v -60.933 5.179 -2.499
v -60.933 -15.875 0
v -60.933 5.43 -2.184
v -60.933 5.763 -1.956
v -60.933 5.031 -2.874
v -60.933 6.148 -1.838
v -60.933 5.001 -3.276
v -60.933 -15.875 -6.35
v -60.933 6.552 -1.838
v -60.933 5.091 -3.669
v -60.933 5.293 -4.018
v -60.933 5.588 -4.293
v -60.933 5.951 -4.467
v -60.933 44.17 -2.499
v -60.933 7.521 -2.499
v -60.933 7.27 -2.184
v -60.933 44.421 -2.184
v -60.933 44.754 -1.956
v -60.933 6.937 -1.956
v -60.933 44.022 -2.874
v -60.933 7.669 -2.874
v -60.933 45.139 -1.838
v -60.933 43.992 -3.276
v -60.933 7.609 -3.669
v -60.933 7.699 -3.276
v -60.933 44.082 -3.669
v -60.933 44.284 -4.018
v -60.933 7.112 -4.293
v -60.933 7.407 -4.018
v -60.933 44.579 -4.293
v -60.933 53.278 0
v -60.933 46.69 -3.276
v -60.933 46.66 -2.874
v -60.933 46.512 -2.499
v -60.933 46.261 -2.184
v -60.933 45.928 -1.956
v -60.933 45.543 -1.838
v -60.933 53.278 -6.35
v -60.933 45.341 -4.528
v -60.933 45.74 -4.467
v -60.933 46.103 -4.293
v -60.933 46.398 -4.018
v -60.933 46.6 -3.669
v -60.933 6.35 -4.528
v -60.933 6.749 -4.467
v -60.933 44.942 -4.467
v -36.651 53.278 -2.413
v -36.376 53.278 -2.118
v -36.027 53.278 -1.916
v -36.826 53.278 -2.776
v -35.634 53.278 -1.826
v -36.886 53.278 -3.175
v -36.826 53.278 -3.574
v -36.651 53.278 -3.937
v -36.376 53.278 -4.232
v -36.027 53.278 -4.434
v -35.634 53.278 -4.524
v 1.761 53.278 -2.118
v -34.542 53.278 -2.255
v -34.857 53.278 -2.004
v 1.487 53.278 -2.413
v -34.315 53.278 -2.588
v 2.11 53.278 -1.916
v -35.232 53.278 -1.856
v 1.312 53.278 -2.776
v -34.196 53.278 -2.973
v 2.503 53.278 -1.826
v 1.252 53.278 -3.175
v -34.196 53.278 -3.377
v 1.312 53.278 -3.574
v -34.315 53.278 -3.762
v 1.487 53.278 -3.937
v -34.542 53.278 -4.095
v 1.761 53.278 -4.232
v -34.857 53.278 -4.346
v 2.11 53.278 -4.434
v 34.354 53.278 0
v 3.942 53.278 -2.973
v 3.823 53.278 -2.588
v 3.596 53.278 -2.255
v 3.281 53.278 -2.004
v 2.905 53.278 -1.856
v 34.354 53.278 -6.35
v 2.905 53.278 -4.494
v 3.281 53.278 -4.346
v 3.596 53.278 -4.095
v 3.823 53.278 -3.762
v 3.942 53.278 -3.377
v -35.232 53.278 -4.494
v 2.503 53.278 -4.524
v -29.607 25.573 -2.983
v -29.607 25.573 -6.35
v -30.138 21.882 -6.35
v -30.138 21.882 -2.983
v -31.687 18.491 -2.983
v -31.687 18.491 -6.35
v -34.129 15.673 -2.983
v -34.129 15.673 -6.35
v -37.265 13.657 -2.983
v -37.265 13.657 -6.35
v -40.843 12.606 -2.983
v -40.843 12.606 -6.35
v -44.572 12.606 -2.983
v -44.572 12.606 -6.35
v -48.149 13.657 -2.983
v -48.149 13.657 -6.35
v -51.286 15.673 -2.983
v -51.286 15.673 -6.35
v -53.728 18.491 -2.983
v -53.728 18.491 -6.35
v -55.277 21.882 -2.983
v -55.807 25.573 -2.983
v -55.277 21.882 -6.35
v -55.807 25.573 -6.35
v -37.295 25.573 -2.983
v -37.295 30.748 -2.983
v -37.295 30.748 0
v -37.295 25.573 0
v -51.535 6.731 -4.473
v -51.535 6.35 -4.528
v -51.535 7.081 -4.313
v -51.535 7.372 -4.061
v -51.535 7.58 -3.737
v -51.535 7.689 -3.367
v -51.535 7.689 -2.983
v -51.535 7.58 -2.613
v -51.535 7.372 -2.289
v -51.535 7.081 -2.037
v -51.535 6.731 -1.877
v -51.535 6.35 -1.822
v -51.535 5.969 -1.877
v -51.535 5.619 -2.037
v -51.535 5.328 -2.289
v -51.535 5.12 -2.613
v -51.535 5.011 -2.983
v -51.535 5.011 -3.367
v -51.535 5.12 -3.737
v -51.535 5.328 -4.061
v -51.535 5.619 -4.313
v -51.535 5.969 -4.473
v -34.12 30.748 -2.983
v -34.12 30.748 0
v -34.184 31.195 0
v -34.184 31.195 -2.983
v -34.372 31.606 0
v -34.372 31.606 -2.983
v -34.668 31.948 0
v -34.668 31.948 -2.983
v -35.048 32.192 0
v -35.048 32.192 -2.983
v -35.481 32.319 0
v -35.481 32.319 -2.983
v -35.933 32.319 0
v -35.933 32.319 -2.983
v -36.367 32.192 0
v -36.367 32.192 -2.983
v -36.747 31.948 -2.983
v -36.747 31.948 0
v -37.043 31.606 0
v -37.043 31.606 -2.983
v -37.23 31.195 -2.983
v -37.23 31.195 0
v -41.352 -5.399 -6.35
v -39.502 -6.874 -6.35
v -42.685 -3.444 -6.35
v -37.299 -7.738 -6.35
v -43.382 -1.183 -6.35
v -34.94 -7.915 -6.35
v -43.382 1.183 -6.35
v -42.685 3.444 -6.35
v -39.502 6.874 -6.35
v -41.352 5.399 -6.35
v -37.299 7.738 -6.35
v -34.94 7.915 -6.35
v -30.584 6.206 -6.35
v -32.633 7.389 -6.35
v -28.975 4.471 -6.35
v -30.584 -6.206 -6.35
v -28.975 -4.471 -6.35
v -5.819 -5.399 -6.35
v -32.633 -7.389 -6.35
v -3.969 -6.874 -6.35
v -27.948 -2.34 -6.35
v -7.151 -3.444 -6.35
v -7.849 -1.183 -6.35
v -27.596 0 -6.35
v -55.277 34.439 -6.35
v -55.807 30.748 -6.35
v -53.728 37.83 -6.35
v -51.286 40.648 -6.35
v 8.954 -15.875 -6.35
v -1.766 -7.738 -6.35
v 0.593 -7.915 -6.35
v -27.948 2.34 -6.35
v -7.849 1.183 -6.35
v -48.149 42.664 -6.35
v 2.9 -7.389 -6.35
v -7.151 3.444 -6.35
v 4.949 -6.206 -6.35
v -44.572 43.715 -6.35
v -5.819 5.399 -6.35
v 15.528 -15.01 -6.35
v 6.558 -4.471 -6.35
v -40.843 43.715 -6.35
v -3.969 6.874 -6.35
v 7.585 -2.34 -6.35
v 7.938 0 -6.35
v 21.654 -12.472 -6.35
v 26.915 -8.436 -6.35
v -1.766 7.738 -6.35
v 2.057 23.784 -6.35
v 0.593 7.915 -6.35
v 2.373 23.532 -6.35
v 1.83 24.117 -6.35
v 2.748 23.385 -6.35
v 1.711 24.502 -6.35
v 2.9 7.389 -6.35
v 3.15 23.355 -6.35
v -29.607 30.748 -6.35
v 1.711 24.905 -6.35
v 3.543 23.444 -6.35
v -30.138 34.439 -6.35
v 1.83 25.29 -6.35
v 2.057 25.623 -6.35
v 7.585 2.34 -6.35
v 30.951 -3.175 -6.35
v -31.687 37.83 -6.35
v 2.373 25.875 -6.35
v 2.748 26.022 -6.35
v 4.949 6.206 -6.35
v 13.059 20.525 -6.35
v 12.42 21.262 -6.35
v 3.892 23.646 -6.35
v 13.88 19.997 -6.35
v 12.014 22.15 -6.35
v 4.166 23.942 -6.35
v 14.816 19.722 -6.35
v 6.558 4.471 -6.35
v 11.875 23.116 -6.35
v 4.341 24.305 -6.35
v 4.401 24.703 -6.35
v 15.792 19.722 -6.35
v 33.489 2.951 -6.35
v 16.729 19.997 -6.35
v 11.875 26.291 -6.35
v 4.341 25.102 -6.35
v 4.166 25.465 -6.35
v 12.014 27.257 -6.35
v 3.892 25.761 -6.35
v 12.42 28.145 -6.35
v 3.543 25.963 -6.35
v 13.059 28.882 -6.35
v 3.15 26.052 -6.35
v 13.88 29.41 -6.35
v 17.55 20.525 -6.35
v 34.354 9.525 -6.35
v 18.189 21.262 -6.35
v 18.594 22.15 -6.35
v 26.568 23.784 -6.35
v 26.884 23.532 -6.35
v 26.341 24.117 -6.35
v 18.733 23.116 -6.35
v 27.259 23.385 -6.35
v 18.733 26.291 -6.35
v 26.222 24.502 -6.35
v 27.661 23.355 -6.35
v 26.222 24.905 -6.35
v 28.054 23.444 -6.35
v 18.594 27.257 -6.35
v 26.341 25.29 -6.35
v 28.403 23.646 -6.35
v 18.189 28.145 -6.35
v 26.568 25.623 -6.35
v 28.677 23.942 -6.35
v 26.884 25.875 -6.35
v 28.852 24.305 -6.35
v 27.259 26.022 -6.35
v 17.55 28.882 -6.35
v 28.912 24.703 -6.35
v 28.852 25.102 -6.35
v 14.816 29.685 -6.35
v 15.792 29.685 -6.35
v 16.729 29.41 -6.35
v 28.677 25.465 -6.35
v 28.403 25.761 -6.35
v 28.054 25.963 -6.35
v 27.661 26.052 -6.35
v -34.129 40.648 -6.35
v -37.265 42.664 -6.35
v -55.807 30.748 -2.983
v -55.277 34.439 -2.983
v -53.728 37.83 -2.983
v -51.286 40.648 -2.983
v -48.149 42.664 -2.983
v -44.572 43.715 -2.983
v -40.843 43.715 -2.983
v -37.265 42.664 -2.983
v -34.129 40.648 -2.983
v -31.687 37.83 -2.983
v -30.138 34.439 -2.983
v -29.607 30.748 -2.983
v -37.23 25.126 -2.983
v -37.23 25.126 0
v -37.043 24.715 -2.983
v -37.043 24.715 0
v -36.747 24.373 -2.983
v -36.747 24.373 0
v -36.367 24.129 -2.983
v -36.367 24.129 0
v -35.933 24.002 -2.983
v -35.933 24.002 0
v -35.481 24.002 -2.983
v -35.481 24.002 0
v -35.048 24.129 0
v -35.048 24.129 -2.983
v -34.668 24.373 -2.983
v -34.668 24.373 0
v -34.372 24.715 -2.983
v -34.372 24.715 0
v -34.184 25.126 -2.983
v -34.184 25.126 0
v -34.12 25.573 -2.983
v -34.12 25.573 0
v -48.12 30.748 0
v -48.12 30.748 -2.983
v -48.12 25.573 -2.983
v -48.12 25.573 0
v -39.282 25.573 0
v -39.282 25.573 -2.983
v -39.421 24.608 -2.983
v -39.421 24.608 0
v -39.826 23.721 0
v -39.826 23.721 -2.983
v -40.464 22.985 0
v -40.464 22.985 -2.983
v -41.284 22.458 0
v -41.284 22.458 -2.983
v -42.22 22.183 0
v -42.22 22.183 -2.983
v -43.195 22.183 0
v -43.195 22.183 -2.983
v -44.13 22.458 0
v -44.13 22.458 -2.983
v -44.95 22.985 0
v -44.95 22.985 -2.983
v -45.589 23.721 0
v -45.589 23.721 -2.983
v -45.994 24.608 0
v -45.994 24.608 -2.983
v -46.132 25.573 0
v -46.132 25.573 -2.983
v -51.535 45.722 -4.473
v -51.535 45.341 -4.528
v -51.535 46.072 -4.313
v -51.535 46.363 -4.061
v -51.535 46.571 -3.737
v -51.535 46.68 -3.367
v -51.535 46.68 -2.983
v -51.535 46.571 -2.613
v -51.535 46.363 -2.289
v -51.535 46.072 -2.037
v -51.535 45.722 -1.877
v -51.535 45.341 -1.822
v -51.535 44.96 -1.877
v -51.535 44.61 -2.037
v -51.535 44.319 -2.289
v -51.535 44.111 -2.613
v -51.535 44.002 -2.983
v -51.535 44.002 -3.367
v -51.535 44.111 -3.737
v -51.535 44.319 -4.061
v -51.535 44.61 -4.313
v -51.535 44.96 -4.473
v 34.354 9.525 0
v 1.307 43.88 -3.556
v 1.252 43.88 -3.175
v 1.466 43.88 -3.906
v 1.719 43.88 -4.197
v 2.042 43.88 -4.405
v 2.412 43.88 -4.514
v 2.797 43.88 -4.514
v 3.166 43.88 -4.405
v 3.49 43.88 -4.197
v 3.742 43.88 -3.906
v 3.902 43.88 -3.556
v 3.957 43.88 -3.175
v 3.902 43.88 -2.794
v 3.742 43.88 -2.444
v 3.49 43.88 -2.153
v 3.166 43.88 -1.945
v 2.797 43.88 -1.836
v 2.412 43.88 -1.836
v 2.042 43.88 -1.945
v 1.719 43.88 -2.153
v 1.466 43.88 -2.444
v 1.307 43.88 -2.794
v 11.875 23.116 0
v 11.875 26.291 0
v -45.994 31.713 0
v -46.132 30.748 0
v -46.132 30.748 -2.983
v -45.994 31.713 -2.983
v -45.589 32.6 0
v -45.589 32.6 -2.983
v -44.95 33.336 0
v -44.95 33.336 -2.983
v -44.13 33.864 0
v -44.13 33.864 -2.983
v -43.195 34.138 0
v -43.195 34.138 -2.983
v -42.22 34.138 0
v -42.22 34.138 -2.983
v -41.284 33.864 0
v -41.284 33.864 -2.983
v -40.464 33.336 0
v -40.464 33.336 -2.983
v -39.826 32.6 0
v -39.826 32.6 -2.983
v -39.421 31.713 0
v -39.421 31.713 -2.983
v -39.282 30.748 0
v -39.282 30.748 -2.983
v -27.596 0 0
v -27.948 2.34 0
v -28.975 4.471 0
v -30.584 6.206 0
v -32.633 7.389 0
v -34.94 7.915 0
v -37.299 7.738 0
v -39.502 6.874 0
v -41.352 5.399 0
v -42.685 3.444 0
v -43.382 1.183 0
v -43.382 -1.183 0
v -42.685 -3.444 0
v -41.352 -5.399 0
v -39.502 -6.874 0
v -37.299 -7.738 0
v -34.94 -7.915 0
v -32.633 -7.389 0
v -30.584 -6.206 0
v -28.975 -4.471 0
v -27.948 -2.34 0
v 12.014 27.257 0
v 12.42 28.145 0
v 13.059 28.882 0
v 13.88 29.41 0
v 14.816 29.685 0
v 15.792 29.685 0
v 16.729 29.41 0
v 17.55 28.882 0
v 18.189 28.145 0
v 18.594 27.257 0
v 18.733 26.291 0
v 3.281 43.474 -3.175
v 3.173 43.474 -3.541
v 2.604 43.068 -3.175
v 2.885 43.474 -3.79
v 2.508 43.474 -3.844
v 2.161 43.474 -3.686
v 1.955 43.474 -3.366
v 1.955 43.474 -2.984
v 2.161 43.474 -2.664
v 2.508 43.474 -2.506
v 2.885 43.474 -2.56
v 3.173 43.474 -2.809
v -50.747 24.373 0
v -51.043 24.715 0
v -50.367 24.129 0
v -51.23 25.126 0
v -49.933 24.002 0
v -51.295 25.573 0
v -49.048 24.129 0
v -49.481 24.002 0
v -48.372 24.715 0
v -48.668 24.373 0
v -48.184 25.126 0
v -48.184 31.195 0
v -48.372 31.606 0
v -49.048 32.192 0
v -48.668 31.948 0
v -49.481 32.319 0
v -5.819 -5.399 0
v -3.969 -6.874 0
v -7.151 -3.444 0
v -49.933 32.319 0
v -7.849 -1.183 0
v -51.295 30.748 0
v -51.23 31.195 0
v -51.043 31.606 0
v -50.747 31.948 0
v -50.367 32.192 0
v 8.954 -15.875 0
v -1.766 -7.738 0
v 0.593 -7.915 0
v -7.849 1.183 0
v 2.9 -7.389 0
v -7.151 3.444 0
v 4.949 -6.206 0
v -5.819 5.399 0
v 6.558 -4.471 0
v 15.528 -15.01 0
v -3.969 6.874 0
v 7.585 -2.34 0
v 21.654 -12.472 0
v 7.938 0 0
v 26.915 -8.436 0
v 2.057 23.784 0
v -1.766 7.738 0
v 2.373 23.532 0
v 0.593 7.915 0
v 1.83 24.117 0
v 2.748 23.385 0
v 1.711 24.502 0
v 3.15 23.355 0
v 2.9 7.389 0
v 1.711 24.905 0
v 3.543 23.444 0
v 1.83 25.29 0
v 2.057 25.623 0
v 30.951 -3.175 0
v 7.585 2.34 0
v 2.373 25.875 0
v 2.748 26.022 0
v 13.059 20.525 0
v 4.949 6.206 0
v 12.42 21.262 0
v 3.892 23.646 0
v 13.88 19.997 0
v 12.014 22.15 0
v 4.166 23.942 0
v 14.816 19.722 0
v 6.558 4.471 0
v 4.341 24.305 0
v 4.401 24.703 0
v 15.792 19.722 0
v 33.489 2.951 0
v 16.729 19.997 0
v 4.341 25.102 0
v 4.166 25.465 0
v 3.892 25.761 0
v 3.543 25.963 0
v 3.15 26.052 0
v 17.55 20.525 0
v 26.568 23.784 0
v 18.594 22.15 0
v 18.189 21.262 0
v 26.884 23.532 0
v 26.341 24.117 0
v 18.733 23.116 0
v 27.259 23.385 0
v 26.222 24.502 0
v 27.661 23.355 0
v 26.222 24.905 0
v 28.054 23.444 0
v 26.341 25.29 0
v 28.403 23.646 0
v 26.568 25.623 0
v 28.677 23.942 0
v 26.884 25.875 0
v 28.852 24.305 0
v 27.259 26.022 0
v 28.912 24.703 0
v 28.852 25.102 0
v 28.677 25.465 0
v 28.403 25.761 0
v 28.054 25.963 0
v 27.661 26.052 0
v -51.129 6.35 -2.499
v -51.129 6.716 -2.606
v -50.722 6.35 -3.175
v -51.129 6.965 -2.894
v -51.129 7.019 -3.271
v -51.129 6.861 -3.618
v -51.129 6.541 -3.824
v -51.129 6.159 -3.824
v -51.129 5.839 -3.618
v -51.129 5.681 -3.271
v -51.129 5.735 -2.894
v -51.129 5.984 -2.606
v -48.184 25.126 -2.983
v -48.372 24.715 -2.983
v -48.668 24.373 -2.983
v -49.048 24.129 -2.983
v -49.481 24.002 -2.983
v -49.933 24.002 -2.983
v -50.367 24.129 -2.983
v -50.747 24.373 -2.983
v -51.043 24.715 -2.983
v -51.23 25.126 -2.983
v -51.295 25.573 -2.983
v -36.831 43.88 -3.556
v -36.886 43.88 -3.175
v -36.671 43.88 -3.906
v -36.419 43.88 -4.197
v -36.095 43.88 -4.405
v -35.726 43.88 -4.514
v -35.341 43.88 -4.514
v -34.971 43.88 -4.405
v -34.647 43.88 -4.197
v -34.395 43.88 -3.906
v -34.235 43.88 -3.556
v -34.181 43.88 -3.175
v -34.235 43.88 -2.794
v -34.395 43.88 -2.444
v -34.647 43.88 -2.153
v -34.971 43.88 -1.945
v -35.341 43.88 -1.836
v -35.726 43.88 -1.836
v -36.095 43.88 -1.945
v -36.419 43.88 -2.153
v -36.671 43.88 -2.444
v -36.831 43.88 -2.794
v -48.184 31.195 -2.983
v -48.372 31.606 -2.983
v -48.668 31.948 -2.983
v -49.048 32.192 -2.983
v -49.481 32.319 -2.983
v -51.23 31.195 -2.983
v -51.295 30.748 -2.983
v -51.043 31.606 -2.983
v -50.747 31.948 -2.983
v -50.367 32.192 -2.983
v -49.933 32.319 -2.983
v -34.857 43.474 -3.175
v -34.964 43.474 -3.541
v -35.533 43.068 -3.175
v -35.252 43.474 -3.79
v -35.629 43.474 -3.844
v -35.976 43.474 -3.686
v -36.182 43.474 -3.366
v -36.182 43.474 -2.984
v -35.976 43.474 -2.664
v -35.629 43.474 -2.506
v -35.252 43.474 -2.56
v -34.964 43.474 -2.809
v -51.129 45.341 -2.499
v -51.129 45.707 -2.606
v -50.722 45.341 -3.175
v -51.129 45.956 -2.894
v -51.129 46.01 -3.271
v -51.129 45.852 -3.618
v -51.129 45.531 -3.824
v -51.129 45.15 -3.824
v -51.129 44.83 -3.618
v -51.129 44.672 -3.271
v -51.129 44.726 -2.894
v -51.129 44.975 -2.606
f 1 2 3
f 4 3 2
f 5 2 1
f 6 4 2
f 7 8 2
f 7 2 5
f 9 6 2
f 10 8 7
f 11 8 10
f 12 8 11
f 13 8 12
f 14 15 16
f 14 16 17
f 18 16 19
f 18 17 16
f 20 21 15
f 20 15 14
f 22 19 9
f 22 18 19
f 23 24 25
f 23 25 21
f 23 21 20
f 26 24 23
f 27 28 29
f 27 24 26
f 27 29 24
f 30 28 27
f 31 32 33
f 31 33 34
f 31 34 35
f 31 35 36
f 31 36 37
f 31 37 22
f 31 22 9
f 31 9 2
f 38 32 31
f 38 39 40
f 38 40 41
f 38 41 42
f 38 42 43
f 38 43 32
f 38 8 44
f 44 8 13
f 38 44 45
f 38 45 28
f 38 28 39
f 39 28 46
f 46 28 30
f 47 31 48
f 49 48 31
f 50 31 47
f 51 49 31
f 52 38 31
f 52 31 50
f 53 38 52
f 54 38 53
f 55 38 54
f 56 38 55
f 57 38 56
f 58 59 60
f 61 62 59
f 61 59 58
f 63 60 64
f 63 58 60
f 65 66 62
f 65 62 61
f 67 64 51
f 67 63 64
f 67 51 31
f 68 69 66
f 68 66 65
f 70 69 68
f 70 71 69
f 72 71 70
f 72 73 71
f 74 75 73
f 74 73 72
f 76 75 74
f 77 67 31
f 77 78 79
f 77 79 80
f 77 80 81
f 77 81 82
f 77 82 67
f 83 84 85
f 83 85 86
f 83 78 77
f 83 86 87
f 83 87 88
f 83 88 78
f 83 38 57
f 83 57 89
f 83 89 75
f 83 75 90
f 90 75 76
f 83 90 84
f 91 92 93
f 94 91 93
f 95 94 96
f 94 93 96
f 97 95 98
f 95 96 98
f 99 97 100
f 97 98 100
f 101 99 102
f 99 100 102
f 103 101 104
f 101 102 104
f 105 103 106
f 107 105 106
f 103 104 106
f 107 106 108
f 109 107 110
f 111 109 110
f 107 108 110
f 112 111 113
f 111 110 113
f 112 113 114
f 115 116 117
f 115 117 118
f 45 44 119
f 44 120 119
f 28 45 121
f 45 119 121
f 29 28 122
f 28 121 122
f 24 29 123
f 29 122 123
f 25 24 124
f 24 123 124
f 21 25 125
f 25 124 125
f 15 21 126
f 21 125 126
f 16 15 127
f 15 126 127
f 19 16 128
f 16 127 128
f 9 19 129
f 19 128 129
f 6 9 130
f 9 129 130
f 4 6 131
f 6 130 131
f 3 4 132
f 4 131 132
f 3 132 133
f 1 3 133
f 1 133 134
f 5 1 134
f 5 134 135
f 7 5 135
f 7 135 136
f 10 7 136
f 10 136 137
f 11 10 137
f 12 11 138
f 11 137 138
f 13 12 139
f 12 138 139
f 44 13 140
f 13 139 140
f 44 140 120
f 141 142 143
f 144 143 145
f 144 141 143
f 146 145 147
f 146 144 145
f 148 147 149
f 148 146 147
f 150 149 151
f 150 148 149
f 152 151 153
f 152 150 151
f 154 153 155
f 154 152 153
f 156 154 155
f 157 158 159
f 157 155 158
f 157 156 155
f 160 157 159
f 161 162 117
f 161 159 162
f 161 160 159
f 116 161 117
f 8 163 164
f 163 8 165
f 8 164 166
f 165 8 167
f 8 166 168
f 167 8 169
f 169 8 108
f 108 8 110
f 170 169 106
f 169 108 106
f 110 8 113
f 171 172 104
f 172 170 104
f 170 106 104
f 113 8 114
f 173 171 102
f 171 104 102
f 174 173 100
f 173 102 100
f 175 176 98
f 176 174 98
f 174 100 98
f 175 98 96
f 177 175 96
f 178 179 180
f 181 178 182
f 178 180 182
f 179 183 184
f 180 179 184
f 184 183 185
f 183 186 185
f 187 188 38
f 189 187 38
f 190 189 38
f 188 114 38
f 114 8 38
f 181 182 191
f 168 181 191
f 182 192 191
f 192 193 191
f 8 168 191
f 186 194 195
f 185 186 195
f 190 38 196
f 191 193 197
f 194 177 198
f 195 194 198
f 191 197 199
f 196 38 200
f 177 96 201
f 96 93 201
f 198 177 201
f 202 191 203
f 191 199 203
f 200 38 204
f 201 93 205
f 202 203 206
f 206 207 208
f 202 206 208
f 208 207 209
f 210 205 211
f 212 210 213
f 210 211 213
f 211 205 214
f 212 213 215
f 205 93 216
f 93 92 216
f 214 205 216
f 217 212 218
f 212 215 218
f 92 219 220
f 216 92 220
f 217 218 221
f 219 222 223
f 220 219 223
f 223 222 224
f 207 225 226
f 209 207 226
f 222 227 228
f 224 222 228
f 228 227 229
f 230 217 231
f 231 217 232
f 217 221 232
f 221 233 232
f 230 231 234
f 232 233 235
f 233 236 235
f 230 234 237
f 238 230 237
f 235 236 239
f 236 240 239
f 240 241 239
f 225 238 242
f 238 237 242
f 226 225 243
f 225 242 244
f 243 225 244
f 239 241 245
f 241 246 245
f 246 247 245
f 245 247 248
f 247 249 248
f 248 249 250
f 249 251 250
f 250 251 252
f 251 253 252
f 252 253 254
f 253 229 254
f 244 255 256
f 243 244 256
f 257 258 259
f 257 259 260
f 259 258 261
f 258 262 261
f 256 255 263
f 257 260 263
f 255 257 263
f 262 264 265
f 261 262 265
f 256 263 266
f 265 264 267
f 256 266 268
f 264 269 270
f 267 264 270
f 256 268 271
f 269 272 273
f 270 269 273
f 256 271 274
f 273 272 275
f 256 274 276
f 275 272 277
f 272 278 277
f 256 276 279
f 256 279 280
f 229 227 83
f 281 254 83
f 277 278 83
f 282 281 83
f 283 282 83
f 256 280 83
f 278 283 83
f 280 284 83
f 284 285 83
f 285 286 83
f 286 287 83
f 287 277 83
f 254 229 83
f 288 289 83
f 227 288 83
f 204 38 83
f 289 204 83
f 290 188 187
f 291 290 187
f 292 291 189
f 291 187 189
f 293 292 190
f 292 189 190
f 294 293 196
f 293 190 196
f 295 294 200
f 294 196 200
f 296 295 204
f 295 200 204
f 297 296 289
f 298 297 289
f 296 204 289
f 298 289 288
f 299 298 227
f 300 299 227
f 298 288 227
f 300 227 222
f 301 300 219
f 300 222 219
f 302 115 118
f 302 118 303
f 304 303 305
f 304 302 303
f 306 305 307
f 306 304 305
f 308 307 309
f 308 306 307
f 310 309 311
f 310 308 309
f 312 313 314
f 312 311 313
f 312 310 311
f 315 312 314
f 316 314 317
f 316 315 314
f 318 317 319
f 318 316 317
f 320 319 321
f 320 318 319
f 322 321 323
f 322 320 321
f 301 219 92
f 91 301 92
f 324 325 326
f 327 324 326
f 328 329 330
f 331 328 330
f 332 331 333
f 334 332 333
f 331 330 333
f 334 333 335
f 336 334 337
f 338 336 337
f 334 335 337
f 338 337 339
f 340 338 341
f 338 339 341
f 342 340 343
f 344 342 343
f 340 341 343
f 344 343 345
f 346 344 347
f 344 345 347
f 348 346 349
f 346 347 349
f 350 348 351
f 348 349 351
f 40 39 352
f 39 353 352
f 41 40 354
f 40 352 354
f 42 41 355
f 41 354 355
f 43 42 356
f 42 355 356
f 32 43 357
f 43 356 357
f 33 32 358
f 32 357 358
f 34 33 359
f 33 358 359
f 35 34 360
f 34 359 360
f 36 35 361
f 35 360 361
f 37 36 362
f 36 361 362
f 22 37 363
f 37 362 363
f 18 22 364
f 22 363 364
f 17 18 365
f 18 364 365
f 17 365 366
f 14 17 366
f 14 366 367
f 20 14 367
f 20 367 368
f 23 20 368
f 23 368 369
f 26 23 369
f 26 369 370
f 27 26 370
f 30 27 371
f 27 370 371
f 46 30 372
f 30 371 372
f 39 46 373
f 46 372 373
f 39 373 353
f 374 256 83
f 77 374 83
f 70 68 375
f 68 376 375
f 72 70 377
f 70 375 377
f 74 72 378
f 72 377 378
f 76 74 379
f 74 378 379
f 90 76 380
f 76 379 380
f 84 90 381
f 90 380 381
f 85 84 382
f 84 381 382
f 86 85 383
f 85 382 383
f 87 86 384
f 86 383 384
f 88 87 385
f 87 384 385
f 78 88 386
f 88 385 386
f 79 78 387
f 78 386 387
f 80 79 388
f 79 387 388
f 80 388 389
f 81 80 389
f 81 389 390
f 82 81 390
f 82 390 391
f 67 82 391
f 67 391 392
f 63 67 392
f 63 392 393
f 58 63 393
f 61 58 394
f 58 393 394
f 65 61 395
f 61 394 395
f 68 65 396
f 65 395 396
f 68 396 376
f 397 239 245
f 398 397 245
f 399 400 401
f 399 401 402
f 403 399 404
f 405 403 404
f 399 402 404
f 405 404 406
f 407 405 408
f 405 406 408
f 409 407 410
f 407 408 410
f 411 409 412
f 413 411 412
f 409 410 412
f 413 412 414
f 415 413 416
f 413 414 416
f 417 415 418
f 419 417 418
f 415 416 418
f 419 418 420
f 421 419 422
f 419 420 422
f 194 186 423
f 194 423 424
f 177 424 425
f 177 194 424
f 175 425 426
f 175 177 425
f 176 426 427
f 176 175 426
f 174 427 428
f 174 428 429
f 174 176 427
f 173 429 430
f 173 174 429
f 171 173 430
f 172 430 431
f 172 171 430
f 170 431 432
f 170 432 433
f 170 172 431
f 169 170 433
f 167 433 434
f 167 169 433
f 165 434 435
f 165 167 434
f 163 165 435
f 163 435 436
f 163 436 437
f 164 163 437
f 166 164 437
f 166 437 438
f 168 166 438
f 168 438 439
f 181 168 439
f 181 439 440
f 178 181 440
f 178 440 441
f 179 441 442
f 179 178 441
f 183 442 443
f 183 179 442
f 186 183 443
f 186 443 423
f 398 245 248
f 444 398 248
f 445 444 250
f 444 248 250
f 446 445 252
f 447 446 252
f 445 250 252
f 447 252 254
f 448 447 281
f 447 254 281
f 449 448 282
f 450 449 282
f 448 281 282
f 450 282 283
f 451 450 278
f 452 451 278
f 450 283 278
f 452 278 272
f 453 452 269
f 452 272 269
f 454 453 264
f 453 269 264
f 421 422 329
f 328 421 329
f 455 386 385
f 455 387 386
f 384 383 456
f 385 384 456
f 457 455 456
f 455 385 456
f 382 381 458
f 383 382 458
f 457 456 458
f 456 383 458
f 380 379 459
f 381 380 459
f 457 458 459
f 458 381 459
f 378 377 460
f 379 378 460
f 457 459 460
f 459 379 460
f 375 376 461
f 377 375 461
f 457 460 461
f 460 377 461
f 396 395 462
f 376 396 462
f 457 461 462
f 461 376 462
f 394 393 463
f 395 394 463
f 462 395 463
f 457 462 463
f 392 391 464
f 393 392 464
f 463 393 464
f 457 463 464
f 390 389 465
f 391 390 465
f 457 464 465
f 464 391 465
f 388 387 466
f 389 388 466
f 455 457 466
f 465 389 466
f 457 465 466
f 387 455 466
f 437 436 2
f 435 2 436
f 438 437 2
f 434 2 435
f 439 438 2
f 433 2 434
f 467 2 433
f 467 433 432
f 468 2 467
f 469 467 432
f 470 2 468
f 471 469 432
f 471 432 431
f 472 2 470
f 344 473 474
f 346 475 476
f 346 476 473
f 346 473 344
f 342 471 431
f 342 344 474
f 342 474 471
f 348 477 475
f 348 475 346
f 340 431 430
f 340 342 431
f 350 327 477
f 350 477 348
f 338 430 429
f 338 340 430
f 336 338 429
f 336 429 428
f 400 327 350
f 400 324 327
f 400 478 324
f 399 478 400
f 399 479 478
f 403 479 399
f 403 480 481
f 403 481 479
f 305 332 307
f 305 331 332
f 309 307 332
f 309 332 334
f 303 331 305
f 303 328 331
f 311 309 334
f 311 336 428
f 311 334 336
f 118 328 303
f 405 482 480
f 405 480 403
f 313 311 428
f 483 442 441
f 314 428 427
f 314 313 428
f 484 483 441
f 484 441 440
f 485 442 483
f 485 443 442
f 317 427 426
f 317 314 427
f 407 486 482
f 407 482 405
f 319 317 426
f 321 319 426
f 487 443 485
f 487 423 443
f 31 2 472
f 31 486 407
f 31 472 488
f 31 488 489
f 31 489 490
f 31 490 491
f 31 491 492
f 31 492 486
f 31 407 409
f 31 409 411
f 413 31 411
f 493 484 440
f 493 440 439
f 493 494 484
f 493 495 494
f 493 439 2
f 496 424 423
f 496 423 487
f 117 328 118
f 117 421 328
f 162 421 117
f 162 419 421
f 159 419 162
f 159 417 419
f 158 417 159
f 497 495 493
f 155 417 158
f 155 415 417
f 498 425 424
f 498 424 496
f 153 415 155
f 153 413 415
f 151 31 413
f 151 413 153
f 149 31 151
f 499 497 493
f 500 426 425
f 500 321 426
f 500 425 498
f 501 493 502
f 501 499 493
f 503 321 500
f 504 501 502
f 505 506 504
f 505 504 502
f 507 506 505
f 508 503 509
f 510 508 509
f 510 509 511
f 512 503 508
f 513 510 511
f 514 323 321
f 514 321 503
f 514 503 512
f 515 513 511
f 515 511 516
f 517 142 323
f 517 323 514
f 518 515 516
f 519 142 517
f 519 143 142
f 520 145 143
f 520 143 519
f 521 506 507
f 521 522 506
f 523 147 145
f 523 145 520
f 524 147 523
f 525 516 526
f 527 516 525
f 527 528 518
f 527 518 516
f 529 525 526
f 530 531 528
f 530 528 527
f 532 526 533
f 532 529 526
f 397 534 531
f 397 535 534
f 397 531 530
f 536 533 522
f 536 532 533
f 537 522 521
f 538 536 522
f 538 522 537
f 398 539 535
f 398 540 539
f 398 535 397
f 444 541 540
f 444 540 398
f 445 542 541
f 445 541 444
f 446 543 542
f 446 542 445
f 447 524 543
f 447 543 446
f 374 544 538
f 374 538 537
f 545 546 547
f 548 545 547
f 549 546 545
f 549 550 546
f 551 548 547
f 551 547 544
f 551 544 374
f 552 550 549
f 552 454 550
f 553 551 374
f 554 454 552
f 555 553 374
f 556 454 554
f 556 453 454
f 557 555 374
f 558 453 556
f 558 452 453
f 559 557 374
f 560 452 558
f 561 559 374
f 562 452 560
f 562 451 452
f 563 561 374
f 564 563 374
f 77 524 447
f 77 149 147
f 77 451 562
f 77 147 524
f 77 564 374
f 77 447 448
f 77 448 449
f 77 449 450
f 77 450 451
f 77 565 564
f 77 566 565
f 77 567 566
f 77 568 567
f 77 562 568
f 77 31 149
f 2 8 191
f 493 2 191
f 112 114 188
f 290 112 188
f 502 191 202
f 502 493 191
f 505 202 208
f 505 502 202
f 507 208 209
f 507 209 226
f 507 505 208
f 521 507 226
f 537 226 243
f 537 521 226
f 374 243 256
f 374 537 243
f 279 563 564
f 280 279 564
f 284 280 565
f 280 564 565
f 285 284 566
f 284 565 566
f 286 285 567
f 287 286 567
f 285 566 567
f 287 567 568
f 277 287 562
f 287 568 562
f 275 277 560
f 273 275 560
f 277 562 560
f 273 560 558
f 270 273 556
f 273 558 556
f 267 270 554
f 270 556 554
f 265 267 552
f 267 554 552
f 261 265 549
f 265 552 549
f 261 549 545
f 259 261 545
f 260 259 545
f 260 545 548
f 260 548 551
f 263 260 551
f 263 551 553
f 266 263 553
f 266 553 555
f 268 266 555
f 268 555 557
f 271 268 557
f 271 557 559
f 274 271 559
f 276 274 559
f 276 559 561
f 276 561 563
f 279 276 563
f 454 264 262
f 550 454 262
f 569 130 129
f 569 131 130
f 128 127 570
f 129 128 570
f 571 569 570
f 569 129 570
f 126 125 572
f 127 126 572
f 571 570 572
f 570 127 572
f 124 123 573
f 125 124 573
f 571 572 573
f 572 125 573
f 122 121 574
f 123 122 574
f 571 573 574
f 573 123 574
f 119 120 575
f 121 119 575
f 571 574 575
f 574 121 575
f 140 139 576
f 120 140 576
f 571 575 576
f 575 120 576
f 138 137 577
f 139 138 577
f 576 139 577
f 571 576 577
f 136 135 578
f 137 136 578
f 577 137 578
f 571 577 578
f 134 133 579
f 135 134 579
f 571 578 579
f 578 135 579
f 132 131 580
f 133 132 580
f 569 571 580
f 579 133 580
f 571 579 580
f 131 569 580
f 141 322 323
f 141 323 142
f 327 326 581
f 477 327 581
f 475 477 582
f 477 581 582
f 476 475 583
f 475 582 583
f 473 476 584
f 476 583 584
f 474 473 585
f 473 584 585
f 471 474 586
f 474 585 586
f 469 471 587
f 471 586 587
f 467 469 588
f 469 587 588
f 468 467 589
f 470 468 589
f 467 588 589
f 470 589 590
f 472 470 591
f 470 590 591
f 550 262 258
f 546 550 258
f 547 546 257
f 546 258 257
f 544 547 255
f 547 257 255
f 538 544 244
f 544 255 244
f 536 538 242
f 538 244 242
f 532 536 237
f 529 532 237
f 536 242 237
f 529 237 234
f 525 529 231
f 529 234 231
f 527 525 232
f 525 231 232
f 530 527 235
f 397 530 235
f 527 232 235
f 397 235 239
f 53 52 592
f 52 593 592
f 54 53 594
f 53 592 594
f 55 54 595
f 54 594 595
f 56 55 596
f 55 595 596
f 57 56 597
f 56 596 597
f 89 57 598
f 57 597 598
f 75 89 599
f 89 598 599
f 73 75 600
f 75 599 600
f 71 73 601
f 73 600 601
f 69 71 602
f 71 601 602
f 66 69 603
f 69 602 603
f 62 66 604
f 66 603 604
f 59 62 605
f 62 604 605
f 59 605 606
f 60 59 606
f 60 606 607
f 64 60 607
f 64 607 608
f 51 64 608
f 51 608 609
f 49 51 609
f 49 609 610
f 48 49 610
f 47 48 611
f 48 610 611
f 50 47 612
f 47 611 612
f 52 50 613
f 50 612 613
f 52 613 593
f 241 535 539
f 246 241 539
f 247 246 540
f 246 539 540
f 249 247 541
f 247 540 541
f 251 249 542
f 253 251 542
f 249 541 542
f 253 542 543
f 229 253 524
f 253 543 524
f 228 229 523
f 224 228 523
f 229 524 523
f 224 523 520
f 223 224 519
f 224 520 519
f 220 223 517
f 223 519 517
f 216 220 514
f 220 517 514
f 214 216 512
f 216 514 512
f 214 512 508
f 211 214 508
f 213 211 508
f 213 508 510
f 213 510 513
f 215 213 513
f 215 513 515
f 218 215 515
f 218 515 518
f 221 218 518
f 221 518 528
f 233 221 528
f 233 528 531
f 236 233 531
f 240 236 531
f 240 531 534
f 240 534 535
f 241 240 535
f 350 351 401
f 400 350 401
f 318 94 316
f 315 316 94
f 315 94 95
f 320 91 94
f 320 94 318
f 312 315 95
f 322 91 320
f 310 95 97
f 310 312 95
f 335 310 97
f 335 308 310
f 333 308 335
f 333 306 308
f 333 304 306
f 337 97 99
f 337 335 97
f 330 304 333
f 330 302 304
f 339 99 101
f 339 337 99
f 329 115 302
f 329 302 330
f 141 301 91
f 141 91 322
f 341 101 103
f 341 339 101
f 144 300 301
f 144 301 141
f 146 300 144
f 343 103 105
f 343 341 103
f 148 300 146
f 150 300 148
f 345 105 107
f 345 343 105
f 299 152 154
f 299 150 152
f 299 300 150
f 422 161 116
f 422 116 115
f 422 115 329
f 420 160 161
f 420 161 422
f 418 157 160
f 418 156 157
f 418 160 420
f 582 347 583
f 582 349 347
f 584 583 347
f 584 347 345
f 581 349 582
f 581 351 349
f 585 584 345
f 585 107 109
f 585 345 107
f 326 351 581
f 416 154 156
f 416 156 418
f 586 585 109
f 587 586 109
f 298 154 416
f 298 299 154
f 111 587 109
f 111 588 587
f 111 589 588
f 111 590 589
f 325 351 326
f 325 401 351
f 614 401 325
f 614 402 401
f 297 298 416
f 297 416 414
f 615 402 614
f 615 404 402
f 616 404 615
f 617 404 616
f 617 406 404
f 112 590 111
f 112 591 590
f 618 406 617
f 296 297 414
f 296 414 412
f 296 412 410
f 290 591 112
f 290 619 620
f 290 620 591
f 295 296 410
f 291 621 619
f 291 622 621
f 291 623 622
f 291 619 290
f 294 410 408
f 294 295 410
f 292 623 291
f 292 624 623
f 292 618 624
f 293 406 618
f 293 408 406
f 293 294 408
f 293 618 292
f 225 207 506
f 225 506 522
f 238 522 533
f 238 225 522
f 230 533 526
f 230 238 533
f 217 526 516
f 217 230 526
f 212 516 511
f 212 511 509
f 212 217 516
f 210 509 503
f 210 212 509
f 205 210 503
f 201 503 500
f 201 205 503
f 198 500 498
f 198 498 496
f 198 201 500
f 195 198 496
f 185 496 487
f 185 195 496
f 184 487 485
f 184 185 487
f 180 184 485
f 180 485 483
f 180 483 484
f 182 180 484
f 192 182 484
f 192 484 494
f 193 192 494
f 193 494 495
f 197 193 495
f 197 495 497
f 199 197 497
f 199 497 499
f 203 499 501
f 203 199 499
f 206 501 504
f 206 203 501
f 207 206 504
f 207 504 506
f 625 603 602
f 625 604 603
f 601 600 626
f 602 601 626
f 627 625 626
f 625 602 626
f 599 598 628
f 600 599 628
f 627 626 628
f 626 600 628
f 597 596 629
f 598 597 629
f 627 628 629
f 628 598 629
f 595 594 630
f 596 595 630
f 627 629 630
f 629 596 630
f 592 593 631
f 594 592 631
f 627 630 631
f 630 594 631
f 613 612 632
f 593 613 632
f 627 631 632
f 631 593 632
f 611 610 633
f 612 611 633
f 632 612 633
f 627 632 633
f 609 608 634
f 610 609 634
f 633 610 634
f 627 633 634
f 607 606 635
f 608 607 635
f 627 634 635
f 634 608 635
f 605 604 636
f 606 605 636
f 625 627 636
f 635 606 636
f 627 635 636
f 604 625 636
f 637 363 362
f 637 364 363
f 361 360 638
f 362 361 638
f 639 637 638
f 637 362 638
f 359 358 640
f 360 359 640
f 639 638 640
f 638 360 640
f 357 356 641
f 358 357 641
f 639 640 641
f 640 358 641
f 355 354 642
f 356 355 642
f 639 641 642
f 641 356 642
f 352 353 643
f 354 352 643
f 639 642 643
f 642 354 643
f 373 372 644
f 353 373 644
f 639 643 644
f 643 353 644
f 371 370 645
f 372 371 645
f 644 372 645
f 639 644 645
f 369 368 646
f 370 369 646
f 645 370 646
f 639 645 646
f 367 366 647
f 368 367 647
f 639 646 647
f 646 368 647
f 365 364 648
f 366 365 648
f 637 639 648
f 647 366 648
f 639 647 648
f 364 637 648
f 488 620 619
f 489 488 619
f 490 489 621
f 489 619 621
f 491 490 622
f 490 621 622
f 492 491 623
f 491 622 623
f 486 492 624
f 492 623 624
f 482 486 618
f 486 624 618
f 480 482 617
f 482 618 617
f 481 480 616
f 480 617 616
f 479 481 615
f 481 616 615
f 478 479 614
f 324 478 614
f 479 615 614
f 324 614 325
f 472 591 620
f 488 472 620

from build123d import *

# Parameters (mm, degrees)
SKETCH1_W                 = 95.287460045
SKETCH1_H                 = 69.153467802
SKETCH1_R                 = 7.9375
BOSS_EXTRUDE1_DEPTH       = 6.35
FILLET1_R                 = 25.4
F_6_32_TAPPED_HOLE1_D     = 2.7051
F_6_32_TAPPED_HOLE1_DEPTH = 10.9728
F_6_32_TAPPED_HOLE1_TIP   = 0.81269403
CUT_EXTRUDE2_DEPTH        = 82.189684793
CUT_EXTRUDE1_DEPTH        = 3.367
F_6_32_TAPPED_HOLE2_D     = 2.7051
F_6_32_TAPPED_HOLE2_DEPTH = 9.398
F_6_32_TAPPED_HOLE2_TIP   = 0.81269403
F_6_32_TAPPED_HOLE3_D     = 2.7051
F_6_32_TAPPED_HOLE3_DEPTH = 9.398
F_6_32_TAPPED_HOLE3_TIP   = 0.81269403


with BuildPart() as part:
    # Sketch1 → Boss-Extrude1 (new body)
    with BuildSketch(Plane.XY.offset(-6.35)):
        with Locations((-13.289407805, 18.701733901)):
            Rectangle(SKETCH1_W, SKETCH1_H)
        with Locations((-35.533137827, 0)):
            Circle(SKETCH1_R, mode=Mode.SUBTRACT)
        Circle(SKETCH1_R, mode=Mode.SUBTRACT)
        with BuildLine():
            Line((11.875322218, 23.115967802), (11.875322218, 26.290967802))
            ThreePointArc((11.875322218, 26.290967802), (15.304322218, 29.719967802), (18.733322218, 26.290967802))
            Line((18.733322218, 26.290967802), (18.733322218, 23.115967802))
            ThreePointArc((18.733322218, 23.115967802), (15.304322218, 19.686967802), (11.875322218, 23.115967802))
        make_face(mode=Mode.SUBTRACT)
    extrude(amount=BOSS_EXTRUDE1_DEPTH)

    # Fillet1
    fillet1_edges = [part.edges().sort_by_distance(p)[0] for p in [
        (34.354322218, -15.875, -3.175),
    ]]
    fillet(fillet1_edges, radius=FILLET1_R)

    # #6-32 Tapped Hole1
    with Locations(Plane(origin=(0, 0, -6.35), x_dir=(-1, 0, 0), z_dir=(0, 0, -1))):
        with Locations((-27.559822218, 24.703467802), (-3.048822218, 24.703467802)):
            Hole(F_6_32_TAPPED_HOLE1_D / 2, depth=F_6_32_TAPPED_HOLE1_DEPTH)
            with Locations((0, 0, -(F_6_32_TAPPED_HOLE1_DEPTH + F_6_32_TAPPED_HOLE1_TIP / 2))):  # 118° drill point
                Cone(0, F_6_32_TAPPED_HOLE1_D / 2, F_6_32_TAPPED_HOLE1_TIP, mode=Mode.SUBTRACT)

    # Sketch4<3> → Cut-Extrude2 (cut, through all)
    with BuildSketch(Plane(origin=(0, 0, -6.35), x_dir=(-1, 0, 0), z_dir=(0, 0, -1))):
        with BuildLine():
            Line((39.282270444, 30.74802952), (39.282270444, 25.573029456))
            ThreePointArc((39.282270444, 25.573029456), (42.707270452, 22.148029448), (46.13227046, 25.573029456))
            Line((46.13227046, 25.573029456), (46.13227046, 30.74802952))
            ThreePointArc((46.13227046, 30.74802952), (42.707270452, 34.173029528), (39.282270444, 30.74802952))
        make_face()
        with BuildLine():
            Line((48.119770452, 30.74802952), (48.119770452, 25.573029456))
            ThreePointArc((48.119770452, 25.573029456), (49.707270452, 23.985529456), (51.294770452, 25.573029456))
            Line((51.294770452, 25.573029456), (51.294770452, 30.74802952))
            ThreePointArc((51.294770452, 30.74802952), (49.707270452, 32.33552952), (48.119770452, 30.74802952))
        make_face()
        with BuildLine():
            Line((37.294770452, 30.74802952), (37.294770452, 25.573029456))
            ThreePointArc((37.294770452, 25.573029456), (35.707270452, 23.985529456), (34.119770452, 25.573029456))
            Line((34.119770452, 25.573029456), (34.119770452, 30.74802952))
            ThreePointArc((34.119770452, 30.74802952), (35.707270452, 32.33552952), (37.294770452, 30.74802952))
        make_face()
    extrude(amount=-CUT_EXTRUDE2_DEPTH, mode=Mode.SUBTRACT)

    # Sketch4 → Cut-Extrude1 (cut)
    with BuildSketch(Plane(origin=(0, 0, -6.35), x_dir=(-1, 0, 0), z_dir=(0, 0, -1))):
        with BuildLine():
            Line((29.607270452, 30.74802952), (29.607270452, 25.573029456))
            ThreePointArc((29.607270452, 25.573029456), (42.707270452, 12.473029456), (55.807270452, 25.573029456))
            Line((55.807270452, 25.573029456), (55.807270452, 30.74802952))
            ThreePointArc((55.807270452, 30.74802952), (42.707270452, 43.84802952), (29.607270452, 30.74802952))
        make_face()
        with BuildLine():
            Line((46.13227046, 30.74802952), (46.13227046, 25.573029456))
            ThreePointArc((46.13227046, 25.573029456), (42.707270452, 22.148029448), (39.282270444, 25.573029456))
            Line((39.282270444, 25.573029456), (39.282270444, 30.74802952))
            ThreePointArc((39.282270444, 30.74802952), (42.707270452, 34.173029528), (46.13227046, 30.74802952))
        make_face(mode=Mode.SUBTRACT)
        with BuildLine():
            Line((34.119770452, 30.74802952), (34.119770452, 25.573029456))
            ThreePointArc((34.119770452, 25.573029456), (35.707270452, 23.985529456), (37.294770452, 25.573029456))
            Line((37.294770452, 25.573029456), (37.294770452, 30.74802952))
            ThreePointArc((37.294770452, 30.74802952), (35.707270452, 32.33552952), (34.119770452, 30.74802952))
        make_face(mode=Mode.SUBTRACT)
        with BuildLine():
            Line((48.119770452, 30.74802952), (48.119770452, 25.573029456))
            ThreePointArc((48.119770452, 25.573029456), (49.707270452, 23.985529456), (51.294770452, 25.573029456))
            Line((51.294770452, 25.573029456), (51.294770452, 30.74802952))
            ThreePointArc((51.294770452, 30.74802952), (49.707270452, 32.33552952), (48.119770452, 30.74802952))
        make_face(mode=Mode.SUBTRACT)
    extrude(amount=-CUT_EXTRUDE1_DEPTH, mode=Mode.SUBTRACT)

    # #6-32 Tapped Hole2
    with Locations(Plane(origin=(0, 53.278467802, 0), x_dir=(1, 0, 0), z_dir=(0, 1, 0))):
        with Locations((-35.533137827, 3.175), (2.604322218, 3.175)):
            Hole(F_6_32_TAPPED_HOLE2_D / 2, depth=F_6_32_TAPPED_HOLE2_DEPTH)
            with Locations((0, 0, -(F_6_32_TAPPED_HOLE2_DEPTH + F_6_32_TAPPED_HOLE2_TIP / 2))):  # 118° drill point
                Cone(0, F_6_32_TAPPED_HOLE2_D / 2, F_6_32_TAPPED_HOLE2_TIP, mode=Mode.SUBTRACT)

    # #6-32 Tapped Hole3
    with Locations(Plane.ZY.offset(60.933137827)):
        with Locations((-3.175, 6.35), (-3.175, 45.340967802)):
            Hole(F_6_32_TAPPED_HOLE3_D / 2, depth=F_6_32_TAPPED_HOLE3_DEPTH)
            with Locations((0, 0, -(F_6_32_TAPPED_HOLE3_DEPTH + F_6_32_TAPPED_HOLE3_TIP / 2))):  # 118° drill point
                Cone(0, F_6_32_TAPPED_HOLE3_D / 2, F_6_32_TAPPED_HOLE3_TIP, mode=Mode.SUBTRACT)


solid = part.part
